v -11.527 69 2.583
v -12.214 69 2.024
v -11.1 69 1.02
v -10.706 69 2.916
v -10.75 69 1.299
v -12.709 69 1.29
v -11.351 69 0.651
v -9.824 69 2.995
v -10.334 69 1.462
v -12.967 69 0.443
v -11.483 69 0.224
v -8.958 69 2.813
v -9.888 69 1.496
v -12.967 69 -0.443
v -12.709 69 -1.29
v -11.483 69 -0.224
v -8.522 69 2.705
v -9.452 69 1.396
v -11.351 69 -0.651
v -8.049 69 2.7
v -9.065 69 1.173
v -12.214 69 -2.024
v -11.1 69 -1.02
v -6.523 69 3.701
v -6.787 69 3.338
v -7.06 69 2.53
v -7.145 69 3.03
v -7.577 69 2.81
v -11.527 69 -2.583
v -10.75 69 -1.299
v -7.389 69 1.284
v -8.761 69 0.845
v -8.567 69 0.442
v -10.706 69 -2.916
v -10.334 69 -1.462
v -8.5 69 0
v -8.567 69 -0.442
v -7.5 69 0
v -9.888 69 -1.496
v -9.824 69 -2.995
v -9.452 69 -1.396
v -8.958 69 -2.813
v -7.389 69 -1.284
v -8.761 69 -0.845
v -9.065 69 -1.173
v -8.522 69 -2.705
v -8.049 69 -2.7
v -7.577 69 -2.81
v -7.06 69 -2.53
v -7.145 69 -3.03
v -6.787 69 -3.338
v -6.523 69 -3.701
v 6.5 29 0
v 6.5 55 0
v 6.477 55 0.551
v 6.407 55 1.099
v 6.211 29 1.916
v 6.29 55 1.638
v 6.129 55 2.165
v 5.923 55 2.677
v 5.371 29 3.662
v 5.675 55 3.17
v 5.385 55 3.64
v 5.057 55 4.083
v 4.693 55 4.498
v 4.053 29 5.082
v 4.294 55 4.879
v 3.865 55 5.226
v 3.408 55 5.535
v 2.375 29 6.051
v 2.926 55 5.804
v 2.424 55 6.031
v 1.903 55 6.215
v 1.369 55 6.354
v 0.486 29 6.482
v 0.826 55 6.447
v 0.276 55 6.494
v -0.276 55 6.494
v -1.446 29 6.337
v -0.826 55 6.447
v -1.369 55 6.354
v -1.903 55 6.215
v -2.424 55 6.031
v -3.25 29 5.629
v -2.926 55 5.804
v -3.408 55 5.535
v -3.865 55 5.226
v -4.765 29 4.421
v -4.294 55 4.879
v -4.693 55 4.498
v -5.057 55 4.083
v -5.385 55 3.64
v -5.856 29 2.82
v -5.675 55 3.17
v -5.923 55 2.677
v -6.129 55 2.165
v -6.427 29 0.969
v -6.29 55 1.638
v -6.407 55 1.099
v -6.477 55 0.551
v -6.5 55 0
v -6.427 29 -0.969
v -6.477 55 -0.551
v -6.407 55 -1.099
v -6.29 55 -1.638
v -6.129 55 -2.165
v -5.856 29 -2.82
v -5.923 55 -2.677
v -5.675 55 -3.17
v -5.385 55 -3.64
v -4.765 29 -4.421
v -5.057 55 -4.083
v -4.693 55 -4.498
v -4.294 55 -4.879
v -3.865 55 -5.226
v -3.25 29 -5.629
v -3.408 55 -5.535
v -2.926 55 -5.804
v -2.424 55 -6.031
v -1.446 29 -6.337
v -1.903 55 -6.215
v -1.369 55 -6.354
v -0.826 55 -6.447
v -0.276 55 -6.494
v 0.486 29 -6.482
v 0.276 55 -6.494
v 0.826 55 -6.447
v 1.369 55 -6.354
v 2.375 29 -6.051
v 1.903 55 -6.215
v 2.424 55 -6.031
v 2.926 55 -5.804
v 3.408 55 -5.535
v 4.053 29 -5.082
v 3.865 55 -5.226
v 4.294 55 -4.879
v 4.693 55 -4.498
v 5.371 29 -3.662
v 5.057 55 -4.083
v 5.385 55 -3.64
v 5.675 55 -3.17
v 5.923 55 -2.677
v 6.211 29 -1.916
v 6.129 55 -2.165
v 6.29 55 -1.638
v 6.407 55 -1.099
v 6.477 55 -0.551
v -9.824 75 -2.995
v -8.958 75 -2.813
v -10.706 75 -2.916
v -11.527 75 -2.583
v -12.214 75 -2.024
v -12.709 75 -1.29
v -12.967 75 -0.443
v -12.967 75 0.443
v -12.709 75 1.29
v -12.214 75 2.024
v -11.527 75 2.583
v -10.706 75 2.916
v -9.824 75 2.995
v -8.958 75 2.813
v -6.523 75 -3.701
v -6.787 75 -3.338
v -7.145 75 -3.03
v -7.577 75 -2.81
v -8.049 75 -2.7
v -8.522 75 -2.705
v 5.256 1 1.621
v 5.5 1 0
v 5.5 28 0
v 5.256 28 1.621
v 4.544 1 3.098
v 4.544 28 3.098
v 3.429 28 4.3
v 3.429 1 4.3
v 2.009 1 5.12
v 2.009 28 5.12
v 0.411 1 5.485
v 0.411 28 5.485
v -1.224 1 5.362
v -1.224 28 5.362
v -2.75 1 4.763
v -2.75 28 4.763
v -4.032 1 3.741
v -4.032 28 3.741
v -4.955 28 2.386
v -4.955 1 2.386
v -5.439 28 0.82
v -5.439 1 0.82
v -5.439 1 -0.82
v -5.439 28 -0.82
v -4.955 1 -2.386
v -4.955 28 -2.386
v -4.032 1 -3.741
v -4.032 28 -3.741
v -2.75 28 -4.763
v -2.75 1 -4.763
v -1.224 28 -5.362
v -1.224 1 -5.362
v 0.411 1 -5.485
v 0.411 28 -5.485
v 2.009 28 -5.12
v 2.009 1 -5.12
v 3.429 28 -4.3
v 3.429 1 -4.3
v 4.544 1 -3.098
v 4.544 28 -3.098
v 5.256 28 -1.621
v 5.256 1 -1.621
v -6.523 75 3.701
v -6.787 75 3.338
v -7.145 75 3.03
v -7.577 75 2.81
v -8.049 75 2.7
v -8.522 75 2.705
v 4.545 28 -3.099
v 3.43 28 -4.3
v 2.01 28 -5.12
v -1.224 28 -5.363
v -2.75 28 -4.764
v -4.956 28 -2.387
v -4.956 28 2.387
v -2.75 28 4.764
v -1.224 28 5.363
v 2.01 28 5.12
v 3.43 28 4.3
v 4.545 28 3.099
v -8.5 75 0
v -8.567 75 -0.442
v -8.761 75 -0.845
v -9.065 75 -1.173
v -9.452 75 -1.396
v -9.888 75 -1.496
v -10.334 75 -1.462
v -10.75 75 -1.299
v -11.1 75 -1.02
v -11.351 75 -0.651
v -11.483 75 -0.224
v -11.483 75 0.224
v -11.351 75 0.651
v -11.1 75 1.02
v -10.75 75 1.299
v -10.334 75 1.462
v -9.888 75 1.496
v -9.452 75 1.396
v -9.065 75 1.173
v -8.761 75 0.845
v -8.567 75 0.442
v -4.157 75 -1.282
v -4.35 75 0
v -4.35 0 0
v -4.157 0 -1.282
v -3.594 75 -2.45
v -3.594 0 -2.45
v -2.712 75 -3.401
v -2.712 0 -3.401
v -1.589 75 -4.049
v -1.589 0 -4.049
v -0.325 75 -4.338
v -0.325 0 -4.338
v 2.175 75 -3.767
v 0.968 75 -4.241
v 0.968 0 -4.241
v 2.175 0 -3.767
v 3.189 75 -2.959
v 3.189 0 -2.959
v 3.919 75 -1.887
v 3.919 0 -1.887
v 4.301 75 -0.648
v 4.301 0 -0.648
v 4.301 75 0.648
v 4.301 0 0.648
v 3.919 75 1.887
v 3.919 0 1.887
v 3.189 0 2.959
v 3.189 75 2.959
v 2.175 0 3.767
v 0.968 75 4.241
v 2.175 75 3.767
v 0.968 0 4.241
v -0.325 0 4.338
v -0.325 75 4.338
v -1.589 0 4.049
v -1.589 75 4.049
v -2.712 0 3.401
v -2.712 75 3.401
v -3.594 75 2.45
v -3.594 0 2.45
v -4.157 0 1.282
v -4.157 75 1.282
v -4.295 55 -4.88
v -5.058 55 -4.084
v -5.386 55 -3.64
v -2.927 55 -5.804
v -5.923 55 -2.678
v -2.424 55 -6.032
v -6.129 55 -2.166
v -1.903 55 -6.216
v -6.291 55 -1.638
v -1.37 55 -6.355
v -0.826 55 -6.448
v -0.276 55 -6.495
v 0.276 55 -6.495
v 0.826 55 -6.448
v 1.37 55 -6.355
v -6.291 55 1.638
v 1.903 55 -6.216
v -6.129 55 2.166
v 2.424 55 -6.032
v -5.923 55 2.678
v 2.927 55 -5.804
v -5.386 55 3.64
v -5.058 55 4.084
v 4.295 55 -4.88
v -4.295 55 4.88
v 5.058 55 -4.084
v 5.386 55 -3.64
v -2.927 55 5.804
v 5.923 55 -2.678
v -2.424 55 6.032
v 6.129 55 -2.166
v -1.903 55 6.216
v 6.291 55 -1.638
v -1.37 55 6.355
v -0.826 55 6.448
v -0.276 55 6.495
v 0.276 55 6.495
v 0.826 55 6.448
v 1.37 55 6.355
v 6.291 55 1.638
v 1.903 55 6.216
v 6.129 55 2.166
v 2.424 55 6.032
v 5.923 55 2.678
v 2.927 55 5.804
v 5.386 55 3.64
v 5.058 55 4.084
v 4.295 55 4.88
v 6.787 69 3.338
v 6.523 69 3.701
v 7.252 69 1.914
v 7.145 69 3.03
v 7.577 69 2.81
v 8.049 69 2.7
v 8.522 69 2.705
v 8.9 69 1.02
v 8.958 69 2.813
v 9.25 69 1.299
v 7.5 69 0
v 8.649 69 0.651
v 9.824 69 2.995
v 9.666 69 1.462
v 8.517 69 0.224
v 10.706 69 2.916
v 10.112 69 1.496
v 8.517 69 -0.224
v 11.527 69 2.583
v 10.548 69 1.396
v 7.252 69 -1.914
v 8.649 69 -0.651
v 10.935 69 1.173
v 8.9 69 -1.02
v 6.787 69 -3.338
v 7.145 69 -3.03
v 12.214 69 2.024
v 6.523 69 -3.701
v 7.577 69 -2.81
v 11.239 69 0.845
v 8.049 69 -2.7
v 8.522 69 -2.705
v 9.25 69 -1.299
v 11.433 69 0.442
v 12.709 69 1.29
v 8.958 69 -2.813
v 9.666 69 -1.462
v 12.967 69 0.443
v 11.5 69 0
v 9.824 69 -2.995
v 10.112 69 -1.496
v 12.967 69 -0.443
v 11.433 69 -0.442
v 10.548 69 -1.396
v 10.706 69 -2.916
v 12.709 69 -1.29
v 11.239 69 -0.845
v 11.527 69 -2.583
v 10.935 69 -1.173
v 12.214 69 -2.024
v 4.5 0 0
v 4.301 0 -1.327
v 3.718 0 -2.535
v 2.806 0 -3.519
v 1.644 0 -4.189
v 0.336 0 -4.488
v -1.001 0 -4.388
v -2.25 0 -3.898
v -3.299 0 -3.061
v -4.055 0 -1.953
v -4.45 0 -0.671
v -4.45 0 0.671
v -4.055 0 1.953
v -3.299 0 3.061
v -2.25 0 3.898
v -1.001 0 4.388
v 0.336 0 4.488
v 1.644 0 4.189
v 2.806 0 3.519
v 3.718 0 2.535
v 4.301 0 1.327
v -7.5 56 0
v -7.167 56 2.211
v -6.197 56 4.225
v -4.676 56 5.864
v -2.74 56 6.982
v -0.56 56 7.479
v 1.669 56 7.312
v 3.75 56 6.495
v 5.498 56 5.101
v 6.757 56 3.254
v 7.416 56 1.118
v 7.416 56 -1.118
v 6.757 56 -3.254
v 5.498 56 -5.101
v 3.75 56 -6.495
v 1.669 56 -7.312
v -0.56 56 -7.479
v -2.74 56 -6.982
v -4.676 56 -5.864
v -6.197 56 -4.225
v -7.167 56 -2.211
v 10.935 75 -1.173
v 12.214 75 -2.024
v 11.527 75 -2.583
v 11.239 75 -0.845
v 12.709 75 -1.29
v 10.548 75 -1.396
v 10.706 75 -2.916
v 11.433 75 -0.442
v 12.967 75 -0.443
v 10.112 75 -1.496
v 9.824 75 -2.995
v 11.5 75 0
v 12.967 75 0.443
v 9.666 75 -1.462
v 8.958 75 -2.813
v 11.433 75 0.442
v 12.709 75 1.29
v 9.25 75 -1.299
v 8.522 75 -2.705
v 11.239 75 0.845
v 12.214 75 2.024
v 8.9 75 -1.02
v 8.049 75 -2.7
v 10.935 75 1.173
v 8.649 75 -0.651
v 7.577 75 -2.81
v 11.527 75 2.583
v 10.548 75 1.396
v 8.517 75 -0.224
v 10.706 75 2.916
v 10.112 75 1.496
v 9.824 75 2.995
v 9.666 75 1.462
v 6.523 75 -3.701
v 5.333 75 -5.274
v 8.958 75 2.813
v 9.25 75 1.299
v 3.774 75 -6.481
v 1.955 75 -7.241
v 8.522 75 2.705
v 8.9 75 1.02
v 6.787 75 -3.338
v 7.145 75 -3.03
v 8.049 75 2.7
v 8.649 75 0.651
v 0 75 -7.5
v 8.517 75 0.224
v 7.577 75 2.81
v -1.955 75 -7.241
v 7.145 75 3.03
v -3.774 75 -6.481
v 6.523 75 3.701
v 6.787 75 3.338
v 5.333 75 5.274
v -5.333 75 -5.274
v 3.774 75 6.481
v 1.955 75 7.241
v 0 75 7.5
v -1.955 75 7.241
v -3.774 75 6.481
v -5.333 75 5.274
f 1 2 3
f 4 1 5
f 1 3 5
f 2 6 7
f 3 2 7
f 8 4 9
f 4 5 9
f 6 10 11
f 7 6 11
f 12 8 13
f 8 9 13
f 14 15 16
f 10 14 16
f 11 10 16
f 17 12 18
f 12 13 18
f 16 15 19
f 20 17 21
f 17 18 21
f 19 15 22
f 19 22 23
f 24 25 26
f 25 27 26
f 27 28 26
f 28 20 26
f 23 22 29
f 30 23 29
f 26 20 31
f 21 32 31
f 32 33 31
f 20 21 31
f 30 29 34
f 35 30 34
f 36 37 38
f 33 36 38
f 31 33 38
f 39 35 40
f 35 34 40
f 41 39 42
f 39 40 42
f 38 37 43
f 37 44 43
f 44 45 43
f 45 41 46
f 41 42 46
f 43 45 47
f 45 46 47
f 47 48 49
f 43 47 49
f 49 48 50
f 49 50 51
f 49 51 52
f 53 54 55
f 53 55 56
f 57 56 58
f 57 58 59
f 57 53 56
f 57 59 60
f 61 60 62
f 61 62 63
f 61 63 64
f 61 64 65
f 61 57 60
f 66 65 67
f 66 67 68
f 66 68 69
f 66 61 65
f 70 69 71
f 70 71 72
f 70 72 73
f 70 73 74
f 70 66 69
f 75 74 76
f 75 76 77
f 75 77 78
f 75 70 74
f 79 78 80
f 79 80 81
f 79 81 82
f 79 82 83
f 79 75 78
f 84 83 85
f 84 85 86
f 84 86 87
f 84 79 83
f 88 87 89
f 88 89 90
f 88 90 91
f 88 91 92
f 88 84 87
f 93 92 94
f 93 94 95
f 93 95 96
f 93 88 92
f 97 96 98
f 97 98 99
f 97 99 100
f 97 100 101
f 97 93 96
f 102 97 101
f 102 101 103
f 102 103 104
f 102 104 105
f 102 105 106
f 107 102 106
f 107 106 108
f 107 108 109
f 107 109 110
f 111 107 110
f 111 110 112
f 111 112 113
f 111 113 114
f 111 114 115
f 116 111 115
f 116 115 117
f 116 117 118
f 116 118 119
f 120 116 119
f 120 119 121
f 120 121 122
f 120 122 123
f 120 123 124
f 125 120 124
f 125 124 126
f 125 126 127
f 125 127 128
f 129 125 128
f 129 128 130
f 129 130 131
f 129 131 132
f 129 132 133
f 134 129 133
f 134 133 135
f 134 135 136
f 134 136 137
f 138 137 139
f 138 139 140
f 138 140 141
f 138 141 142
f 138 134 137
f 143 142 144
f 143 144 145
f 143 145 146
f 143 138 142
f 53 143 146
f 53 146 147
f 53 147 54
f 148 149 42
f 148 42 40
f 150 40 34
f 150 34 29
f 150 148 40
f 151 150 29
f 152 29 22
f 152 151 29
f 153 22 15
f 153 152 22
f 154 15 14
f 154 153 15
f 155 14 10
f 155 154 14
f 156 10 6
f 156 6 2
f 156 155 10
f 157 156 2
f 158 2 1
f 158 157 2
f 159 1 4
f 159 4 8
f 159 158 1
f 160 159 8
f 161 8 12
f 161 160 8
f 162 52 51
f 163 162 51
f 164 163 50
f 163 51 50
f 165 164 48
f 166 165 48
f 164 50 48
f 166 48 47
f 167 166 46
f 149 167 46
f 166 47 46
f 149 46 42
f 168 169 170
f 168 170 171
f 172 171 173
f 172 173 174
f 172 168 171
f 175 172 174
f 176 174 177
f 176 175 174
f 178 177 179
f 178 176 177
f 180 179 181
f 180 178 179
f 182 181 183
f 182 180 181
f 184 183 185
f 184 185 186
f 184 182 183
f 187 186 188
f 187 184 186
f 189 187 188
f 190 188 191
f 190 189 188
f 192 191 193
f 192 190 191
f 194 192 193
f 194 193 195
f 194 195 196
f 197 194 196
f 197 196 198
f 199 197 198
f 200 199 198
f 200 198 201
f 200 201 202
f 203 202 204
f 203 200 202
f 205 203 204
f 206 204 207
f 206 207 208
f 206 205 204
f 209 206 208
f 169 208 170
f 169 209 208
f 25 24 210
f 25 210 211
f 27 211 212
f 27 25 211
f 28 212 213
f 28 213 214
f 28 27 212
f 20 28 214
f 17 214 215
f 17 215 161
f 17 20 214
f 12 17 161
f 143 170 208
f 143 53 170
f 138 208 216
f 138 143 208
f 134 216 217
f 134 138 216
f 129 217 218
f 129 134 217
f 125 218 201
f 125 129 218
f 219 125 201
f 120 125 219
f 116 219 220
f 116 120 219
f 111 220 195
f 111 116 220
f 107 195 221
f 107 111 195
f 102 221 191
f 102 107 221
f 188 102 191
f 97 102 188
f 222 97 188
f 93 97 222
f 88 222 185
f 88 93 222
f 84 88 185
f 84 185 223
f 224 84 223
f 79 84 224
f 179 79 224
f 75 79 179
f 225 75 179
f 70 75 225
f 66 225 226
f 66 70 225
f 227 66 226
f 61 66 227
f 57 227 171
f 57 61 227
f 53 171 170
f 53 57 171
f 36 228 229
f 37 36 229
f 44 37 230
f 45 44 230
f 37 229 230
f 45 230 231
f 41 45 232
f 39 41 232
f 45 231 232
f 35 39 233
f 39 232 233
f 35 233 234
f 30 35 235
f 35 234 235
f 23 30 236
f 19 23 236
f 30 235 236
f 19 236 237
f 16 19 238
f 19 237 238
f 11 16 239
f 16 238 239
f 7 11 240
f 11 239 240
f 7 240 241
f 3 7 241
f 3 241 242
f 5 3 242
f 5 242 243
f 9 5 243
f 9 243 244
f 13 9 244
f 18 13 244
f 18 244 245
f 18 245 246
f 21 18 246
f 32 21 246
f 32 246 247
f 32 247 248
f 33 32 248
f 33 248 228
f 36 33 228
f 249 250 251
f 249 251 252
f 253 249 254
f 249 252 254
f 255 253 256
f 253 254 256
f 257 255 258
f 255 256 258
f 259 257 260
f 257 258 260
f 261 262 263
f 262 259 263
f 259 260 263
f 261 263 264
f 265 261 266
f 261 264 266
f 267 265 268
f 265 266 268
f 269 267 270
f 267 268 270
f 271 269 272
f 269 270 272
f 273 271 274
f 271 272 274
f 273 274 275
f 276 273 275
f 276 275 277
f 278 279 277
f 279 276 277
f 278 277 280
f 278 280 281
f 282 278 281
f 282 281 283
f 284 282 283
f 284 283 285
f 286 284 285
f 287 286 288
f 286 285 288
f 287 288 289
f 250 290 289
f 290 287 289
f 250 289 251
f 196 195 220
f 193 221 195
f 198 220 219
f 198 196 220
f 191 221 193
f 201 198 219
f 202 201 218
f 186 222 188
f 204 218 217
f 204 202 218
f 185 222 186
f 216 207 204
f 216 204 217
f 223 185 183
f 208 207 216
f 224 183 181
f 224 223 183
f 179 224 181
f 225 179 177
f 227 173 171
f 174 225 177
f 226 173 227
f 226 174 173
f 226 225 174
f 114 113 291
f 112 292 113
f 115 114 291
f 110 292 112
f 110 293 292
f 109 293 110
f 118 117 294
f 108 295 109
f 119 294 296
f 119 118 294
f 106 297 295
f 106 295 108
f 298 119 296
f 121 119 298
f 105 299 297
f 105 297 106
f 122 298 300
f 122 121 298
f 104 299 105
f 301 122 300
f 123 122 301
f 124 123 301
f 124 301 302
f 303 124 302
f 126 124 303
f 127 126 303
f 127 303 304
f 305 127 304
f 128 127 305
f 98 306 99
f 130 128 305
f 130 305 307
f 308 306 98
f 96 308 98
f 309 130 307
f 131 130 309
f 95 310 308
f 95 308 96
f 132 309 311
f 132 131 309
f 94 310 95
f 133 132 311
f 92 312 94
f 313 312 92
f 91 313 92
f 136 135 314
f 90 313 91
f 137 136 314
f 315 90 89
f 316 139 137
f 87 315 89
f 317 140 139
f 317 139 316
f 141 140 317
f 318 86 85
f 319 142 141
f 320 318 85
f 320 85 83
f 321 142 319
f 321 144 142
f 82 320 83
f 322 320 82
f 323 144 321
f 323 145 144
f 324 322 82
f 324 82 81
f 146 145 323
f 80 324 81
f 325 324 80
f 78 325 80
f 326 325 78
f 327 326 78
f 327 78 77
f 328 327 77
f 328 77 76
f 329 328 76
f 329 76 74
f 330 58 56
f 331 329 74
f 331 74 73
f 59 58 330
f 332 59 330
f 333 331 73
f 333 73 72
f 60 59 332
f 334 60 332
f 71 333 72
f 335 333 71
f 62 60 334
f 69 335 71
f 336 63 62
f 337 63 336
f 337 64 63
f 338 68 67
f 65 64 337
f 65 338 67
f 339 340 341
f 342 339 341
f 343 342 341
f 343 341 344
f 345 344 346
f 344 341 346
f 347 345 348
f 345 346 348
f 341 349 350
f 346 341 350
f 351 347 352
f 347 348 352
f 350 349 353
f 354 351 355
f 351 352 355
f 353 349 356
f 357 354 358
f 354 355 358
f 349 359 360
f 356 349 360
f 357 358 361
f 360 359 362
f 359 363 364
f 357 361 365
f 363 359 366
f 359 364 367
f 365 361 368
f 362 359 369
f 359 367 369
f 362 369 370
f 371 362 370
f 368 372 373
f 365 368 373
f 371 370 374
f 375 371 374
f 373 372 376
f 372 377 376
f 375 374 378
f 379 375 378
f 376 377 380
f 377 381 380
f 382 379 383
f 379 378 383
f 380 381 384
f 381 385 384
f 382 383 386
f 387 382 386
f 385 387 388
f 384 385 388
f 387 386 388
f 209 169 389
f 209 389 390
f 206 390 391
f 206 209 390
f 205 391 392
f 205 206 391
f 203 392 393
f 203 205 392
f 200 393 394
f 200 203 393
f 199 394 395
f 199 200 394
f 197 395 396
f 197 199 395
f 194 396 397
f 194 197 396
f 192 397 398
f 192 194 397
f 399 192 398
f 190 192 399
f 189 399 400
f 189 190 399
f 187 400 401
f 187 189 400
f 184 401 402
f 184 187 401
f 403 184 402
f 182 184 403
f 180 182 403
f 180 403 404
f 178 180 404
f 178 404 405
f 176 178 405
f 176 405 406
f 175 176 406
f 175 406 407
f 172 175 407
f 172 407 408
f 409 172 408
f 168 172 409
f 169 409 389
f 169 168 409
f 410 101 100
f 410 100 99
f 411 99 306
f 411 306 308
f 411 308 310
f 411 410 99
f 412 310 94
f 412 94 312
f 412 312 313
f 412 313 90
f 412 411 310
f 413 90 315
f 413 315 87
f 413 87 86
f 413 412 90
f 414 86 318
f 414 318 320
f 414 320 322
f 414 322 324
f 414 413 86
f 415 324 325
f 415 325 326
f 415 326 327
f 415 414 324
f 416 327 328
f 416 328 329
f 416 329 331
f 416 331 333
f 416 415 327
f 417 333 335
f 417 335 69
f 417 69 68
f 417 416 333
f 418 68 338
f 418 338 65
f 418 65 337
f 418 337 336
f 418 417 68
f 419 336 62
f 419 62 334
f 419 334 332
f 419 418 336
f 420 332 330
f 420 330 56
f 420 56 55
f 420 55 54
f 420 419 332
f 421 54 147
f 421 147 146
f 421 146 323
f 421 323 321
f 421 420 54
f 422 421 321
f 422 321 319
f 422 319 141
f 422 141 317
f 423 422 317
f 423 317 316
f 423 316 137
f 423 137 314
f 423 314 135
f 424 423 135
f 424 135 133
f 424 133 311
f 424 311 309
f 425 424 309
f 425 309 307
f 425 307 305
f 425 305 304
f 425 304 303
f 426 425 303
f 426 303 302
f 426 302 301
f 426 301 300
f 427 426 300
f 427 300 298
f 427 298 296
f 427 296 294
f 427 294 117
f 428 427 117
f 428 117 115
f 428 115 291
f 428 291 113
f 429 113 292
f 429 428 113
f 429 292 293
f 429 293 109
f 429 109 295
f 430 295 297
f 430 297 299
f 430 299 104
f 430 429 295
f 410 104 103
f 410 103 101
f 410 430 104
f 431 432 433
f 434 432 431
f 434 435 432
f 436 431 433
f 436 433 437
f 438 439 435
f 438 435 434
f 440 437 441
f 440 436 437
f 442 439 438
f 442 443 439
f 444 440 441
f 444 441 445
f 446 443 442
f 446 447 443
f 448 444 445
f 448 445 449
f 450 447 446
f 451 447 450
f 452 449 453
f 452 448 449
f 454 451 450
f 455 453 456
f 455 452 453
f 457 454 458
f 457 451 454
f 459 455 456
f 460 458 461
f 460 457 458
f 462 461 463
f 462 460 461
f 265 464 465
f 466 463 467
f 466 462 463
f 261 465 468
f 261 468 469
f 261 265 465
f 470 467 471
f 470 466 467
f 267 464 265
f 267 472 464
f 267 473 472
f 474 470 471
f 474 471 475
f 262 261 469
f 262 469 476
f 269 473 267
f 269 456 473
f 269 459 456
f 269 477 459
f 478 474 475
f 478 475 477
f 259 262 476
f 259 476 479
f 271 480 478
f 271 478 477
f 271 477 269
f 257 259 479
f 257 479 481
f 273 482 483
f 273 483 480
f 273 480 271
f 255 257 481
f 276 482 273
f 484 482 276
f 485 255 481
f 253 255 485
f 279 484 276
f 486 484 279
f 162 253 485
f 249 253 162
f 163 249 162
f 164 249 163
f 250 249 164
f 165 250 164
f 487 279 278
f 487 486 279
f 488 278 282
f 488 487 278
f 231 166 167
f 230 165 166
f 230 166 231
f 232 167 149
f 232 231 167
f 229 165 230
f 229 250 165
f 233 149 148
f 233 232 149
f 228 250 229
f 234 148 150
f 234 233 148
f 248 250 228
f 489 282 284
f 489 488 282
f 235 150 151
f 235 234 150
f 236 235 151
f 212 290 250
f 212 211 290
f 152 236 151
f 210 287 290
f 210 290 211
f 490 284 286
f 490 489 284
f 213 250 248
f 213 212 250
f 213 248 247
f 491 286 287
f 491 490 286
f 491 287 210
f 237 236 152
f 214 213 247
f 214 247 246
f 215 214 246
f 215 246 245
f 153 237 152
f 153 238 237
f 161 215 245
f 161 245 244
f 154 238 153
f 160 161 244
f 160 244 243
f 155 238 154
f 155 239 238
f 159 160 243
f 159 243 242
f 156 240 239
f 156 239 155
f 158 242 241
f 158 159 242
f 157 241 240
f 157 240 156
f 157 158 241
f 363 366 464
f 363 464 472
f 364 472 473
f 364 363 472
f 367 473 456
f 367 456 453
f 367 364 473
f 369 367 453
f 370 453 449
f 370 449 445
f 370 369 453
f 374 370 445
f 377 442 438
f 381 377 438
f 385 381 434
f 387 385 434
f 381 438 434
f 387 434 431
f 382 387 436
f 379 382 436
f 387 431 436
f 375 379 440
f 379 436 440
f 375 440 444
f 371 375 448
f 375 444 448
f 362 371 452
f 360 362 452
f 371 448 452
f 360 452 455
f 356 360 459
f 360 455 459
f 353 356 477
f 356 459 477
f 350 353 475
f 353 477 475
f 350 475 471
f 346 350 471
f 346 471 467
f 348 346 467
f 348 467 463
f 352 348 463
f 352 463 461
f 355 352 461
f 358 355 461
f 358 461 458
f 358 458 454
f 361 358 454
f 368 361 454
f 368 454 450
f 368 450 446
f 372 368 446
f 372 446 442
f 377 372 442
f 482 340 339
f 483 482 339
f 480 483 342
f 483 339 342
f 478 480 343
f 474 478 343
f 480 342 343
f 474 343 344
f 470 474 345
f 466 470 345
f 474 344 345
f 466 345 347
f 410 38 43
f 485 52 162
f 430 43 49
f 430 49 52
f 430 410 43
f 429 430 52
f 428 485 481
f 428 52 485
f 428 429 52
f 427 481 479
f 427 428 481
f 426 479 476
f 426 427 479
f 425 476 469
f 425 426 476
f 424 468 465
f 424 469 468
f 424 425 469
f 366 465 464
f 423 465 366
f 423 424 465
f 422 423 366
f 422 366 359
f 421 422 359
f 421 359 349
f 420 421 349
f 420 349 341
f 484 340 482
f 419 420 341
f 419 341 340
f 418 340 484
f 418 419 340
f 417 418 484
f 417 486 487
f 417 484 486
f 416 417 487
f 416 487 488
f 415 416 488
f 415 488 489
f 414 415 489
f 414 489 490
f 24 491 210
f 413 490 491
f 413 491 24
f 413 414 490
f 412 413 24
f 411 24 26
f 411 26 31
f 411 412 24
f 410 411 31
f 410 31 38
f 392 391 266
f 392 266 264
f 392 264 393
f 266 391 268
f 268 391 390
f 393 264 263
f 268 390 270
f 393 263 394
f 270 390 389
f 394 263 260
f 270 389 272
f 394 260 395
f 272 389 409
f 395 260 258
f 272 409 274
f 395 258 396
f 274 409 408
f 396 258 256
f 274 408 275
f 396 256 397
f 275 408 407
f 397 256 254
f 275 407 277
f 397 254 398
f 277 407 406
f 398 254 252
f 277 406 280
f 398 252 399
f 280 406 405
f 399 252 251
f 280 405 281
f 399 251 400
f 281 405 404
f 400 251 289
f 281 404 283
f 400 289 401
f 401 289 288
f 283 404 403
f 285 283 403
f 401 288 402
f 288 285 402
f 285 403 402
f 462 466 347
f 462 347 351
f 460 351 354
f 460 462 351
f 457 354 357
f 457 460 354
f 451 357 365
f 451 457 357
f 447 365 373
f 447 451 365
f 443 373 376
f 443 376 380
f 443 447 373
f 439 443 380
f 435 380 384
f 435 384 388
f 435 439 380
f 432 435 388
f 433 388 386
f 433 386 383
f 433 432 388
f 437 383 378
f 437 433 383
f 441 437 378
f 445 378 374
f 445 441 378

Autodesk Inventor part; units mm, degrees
ref_plane "YZ Plane" through (0, 0, 0) normal (1, 0, 0) x (0, 1, 0)
ref_plane "XZ Plane" through (0, 0, 0) normal (0, 1, 0) x (-1, 0, 0)
ref_plane "XY Plane" through (0, 0, 0) normal (0, 0, 1) x (1, 0, 0)
sketch "Sketch1" plane through (0, 0, 0) normal (0, 1, 0) x (-1, 0, 0)
  circle A0 centre (0, 0) radius 4.35
  circle A1 centre (0, 0) radius 7.5
  dimension "d0" = 8.7
  dimension "d4" = 15
extrude "Extrusion1" add sketch "Sketch1" along normal blind 75
sketch "Sketch2" plane through (0, 75, 0) normal (0, 1, 0) x (1, 0, 0)
  circle A0 centre (-10, 0) radius 1.5
  circle A1 centre (10, 0) radius 1.5
  circle A2 centre (-10, 0) radius 3
  circle A3 centre (10, 0) radius 3
  point P0 (0, 0)
  dimension "d8" = 3
  dimension "d9" = 20
  dimension "d10" = 10
  dimension "d11" = 6
extrude "Extrusion2" add sketch "Sketch2" against normal blind 6
fillet "Fillet1" radius 2 4 edges at (-7.3625, 72, -1.4295) (-7.3625, 72, 1.4295) (7.3625, 72, -1.4295) (7.3625, 72, 1.4295)
sketch "Sketch3" plane through (0, 0, 0) normal (0, -1, 0) x (1, 0, 0)
  circle A0 centre (0, 0) radius 6.5
  circle A1 centre (0, 0) radius 6.5
  circle A2 centre (0, 0) radius 7.5
  circle A3 centre (0, 0) radius 7.5 projected
  dimension "d15" = 13
extrude "Extrusion3" cut sketch "Sketch3" against normal blind 55
sketch "Sketch4" plane through (0, 0, 0) normal (0, -1, 0) x (1, 0, 0)
  circle A0 centre (0, 0) radius 5.5
  circle A1 centre (0, 0) radius 6.5
  circle A2 centre (0, 0) radius 6.5 projected
  dimension "d18" = 11
extrude "Extrusion4" cut sketch "Sketch4" against normal blind 28
chamfer "Chamfer2" distance 1 angle 45 3 edges at (7.5, 55, 0) (-6.5, 28, 0) (-5.5, 0, 0)
properties part number "Spacer"
